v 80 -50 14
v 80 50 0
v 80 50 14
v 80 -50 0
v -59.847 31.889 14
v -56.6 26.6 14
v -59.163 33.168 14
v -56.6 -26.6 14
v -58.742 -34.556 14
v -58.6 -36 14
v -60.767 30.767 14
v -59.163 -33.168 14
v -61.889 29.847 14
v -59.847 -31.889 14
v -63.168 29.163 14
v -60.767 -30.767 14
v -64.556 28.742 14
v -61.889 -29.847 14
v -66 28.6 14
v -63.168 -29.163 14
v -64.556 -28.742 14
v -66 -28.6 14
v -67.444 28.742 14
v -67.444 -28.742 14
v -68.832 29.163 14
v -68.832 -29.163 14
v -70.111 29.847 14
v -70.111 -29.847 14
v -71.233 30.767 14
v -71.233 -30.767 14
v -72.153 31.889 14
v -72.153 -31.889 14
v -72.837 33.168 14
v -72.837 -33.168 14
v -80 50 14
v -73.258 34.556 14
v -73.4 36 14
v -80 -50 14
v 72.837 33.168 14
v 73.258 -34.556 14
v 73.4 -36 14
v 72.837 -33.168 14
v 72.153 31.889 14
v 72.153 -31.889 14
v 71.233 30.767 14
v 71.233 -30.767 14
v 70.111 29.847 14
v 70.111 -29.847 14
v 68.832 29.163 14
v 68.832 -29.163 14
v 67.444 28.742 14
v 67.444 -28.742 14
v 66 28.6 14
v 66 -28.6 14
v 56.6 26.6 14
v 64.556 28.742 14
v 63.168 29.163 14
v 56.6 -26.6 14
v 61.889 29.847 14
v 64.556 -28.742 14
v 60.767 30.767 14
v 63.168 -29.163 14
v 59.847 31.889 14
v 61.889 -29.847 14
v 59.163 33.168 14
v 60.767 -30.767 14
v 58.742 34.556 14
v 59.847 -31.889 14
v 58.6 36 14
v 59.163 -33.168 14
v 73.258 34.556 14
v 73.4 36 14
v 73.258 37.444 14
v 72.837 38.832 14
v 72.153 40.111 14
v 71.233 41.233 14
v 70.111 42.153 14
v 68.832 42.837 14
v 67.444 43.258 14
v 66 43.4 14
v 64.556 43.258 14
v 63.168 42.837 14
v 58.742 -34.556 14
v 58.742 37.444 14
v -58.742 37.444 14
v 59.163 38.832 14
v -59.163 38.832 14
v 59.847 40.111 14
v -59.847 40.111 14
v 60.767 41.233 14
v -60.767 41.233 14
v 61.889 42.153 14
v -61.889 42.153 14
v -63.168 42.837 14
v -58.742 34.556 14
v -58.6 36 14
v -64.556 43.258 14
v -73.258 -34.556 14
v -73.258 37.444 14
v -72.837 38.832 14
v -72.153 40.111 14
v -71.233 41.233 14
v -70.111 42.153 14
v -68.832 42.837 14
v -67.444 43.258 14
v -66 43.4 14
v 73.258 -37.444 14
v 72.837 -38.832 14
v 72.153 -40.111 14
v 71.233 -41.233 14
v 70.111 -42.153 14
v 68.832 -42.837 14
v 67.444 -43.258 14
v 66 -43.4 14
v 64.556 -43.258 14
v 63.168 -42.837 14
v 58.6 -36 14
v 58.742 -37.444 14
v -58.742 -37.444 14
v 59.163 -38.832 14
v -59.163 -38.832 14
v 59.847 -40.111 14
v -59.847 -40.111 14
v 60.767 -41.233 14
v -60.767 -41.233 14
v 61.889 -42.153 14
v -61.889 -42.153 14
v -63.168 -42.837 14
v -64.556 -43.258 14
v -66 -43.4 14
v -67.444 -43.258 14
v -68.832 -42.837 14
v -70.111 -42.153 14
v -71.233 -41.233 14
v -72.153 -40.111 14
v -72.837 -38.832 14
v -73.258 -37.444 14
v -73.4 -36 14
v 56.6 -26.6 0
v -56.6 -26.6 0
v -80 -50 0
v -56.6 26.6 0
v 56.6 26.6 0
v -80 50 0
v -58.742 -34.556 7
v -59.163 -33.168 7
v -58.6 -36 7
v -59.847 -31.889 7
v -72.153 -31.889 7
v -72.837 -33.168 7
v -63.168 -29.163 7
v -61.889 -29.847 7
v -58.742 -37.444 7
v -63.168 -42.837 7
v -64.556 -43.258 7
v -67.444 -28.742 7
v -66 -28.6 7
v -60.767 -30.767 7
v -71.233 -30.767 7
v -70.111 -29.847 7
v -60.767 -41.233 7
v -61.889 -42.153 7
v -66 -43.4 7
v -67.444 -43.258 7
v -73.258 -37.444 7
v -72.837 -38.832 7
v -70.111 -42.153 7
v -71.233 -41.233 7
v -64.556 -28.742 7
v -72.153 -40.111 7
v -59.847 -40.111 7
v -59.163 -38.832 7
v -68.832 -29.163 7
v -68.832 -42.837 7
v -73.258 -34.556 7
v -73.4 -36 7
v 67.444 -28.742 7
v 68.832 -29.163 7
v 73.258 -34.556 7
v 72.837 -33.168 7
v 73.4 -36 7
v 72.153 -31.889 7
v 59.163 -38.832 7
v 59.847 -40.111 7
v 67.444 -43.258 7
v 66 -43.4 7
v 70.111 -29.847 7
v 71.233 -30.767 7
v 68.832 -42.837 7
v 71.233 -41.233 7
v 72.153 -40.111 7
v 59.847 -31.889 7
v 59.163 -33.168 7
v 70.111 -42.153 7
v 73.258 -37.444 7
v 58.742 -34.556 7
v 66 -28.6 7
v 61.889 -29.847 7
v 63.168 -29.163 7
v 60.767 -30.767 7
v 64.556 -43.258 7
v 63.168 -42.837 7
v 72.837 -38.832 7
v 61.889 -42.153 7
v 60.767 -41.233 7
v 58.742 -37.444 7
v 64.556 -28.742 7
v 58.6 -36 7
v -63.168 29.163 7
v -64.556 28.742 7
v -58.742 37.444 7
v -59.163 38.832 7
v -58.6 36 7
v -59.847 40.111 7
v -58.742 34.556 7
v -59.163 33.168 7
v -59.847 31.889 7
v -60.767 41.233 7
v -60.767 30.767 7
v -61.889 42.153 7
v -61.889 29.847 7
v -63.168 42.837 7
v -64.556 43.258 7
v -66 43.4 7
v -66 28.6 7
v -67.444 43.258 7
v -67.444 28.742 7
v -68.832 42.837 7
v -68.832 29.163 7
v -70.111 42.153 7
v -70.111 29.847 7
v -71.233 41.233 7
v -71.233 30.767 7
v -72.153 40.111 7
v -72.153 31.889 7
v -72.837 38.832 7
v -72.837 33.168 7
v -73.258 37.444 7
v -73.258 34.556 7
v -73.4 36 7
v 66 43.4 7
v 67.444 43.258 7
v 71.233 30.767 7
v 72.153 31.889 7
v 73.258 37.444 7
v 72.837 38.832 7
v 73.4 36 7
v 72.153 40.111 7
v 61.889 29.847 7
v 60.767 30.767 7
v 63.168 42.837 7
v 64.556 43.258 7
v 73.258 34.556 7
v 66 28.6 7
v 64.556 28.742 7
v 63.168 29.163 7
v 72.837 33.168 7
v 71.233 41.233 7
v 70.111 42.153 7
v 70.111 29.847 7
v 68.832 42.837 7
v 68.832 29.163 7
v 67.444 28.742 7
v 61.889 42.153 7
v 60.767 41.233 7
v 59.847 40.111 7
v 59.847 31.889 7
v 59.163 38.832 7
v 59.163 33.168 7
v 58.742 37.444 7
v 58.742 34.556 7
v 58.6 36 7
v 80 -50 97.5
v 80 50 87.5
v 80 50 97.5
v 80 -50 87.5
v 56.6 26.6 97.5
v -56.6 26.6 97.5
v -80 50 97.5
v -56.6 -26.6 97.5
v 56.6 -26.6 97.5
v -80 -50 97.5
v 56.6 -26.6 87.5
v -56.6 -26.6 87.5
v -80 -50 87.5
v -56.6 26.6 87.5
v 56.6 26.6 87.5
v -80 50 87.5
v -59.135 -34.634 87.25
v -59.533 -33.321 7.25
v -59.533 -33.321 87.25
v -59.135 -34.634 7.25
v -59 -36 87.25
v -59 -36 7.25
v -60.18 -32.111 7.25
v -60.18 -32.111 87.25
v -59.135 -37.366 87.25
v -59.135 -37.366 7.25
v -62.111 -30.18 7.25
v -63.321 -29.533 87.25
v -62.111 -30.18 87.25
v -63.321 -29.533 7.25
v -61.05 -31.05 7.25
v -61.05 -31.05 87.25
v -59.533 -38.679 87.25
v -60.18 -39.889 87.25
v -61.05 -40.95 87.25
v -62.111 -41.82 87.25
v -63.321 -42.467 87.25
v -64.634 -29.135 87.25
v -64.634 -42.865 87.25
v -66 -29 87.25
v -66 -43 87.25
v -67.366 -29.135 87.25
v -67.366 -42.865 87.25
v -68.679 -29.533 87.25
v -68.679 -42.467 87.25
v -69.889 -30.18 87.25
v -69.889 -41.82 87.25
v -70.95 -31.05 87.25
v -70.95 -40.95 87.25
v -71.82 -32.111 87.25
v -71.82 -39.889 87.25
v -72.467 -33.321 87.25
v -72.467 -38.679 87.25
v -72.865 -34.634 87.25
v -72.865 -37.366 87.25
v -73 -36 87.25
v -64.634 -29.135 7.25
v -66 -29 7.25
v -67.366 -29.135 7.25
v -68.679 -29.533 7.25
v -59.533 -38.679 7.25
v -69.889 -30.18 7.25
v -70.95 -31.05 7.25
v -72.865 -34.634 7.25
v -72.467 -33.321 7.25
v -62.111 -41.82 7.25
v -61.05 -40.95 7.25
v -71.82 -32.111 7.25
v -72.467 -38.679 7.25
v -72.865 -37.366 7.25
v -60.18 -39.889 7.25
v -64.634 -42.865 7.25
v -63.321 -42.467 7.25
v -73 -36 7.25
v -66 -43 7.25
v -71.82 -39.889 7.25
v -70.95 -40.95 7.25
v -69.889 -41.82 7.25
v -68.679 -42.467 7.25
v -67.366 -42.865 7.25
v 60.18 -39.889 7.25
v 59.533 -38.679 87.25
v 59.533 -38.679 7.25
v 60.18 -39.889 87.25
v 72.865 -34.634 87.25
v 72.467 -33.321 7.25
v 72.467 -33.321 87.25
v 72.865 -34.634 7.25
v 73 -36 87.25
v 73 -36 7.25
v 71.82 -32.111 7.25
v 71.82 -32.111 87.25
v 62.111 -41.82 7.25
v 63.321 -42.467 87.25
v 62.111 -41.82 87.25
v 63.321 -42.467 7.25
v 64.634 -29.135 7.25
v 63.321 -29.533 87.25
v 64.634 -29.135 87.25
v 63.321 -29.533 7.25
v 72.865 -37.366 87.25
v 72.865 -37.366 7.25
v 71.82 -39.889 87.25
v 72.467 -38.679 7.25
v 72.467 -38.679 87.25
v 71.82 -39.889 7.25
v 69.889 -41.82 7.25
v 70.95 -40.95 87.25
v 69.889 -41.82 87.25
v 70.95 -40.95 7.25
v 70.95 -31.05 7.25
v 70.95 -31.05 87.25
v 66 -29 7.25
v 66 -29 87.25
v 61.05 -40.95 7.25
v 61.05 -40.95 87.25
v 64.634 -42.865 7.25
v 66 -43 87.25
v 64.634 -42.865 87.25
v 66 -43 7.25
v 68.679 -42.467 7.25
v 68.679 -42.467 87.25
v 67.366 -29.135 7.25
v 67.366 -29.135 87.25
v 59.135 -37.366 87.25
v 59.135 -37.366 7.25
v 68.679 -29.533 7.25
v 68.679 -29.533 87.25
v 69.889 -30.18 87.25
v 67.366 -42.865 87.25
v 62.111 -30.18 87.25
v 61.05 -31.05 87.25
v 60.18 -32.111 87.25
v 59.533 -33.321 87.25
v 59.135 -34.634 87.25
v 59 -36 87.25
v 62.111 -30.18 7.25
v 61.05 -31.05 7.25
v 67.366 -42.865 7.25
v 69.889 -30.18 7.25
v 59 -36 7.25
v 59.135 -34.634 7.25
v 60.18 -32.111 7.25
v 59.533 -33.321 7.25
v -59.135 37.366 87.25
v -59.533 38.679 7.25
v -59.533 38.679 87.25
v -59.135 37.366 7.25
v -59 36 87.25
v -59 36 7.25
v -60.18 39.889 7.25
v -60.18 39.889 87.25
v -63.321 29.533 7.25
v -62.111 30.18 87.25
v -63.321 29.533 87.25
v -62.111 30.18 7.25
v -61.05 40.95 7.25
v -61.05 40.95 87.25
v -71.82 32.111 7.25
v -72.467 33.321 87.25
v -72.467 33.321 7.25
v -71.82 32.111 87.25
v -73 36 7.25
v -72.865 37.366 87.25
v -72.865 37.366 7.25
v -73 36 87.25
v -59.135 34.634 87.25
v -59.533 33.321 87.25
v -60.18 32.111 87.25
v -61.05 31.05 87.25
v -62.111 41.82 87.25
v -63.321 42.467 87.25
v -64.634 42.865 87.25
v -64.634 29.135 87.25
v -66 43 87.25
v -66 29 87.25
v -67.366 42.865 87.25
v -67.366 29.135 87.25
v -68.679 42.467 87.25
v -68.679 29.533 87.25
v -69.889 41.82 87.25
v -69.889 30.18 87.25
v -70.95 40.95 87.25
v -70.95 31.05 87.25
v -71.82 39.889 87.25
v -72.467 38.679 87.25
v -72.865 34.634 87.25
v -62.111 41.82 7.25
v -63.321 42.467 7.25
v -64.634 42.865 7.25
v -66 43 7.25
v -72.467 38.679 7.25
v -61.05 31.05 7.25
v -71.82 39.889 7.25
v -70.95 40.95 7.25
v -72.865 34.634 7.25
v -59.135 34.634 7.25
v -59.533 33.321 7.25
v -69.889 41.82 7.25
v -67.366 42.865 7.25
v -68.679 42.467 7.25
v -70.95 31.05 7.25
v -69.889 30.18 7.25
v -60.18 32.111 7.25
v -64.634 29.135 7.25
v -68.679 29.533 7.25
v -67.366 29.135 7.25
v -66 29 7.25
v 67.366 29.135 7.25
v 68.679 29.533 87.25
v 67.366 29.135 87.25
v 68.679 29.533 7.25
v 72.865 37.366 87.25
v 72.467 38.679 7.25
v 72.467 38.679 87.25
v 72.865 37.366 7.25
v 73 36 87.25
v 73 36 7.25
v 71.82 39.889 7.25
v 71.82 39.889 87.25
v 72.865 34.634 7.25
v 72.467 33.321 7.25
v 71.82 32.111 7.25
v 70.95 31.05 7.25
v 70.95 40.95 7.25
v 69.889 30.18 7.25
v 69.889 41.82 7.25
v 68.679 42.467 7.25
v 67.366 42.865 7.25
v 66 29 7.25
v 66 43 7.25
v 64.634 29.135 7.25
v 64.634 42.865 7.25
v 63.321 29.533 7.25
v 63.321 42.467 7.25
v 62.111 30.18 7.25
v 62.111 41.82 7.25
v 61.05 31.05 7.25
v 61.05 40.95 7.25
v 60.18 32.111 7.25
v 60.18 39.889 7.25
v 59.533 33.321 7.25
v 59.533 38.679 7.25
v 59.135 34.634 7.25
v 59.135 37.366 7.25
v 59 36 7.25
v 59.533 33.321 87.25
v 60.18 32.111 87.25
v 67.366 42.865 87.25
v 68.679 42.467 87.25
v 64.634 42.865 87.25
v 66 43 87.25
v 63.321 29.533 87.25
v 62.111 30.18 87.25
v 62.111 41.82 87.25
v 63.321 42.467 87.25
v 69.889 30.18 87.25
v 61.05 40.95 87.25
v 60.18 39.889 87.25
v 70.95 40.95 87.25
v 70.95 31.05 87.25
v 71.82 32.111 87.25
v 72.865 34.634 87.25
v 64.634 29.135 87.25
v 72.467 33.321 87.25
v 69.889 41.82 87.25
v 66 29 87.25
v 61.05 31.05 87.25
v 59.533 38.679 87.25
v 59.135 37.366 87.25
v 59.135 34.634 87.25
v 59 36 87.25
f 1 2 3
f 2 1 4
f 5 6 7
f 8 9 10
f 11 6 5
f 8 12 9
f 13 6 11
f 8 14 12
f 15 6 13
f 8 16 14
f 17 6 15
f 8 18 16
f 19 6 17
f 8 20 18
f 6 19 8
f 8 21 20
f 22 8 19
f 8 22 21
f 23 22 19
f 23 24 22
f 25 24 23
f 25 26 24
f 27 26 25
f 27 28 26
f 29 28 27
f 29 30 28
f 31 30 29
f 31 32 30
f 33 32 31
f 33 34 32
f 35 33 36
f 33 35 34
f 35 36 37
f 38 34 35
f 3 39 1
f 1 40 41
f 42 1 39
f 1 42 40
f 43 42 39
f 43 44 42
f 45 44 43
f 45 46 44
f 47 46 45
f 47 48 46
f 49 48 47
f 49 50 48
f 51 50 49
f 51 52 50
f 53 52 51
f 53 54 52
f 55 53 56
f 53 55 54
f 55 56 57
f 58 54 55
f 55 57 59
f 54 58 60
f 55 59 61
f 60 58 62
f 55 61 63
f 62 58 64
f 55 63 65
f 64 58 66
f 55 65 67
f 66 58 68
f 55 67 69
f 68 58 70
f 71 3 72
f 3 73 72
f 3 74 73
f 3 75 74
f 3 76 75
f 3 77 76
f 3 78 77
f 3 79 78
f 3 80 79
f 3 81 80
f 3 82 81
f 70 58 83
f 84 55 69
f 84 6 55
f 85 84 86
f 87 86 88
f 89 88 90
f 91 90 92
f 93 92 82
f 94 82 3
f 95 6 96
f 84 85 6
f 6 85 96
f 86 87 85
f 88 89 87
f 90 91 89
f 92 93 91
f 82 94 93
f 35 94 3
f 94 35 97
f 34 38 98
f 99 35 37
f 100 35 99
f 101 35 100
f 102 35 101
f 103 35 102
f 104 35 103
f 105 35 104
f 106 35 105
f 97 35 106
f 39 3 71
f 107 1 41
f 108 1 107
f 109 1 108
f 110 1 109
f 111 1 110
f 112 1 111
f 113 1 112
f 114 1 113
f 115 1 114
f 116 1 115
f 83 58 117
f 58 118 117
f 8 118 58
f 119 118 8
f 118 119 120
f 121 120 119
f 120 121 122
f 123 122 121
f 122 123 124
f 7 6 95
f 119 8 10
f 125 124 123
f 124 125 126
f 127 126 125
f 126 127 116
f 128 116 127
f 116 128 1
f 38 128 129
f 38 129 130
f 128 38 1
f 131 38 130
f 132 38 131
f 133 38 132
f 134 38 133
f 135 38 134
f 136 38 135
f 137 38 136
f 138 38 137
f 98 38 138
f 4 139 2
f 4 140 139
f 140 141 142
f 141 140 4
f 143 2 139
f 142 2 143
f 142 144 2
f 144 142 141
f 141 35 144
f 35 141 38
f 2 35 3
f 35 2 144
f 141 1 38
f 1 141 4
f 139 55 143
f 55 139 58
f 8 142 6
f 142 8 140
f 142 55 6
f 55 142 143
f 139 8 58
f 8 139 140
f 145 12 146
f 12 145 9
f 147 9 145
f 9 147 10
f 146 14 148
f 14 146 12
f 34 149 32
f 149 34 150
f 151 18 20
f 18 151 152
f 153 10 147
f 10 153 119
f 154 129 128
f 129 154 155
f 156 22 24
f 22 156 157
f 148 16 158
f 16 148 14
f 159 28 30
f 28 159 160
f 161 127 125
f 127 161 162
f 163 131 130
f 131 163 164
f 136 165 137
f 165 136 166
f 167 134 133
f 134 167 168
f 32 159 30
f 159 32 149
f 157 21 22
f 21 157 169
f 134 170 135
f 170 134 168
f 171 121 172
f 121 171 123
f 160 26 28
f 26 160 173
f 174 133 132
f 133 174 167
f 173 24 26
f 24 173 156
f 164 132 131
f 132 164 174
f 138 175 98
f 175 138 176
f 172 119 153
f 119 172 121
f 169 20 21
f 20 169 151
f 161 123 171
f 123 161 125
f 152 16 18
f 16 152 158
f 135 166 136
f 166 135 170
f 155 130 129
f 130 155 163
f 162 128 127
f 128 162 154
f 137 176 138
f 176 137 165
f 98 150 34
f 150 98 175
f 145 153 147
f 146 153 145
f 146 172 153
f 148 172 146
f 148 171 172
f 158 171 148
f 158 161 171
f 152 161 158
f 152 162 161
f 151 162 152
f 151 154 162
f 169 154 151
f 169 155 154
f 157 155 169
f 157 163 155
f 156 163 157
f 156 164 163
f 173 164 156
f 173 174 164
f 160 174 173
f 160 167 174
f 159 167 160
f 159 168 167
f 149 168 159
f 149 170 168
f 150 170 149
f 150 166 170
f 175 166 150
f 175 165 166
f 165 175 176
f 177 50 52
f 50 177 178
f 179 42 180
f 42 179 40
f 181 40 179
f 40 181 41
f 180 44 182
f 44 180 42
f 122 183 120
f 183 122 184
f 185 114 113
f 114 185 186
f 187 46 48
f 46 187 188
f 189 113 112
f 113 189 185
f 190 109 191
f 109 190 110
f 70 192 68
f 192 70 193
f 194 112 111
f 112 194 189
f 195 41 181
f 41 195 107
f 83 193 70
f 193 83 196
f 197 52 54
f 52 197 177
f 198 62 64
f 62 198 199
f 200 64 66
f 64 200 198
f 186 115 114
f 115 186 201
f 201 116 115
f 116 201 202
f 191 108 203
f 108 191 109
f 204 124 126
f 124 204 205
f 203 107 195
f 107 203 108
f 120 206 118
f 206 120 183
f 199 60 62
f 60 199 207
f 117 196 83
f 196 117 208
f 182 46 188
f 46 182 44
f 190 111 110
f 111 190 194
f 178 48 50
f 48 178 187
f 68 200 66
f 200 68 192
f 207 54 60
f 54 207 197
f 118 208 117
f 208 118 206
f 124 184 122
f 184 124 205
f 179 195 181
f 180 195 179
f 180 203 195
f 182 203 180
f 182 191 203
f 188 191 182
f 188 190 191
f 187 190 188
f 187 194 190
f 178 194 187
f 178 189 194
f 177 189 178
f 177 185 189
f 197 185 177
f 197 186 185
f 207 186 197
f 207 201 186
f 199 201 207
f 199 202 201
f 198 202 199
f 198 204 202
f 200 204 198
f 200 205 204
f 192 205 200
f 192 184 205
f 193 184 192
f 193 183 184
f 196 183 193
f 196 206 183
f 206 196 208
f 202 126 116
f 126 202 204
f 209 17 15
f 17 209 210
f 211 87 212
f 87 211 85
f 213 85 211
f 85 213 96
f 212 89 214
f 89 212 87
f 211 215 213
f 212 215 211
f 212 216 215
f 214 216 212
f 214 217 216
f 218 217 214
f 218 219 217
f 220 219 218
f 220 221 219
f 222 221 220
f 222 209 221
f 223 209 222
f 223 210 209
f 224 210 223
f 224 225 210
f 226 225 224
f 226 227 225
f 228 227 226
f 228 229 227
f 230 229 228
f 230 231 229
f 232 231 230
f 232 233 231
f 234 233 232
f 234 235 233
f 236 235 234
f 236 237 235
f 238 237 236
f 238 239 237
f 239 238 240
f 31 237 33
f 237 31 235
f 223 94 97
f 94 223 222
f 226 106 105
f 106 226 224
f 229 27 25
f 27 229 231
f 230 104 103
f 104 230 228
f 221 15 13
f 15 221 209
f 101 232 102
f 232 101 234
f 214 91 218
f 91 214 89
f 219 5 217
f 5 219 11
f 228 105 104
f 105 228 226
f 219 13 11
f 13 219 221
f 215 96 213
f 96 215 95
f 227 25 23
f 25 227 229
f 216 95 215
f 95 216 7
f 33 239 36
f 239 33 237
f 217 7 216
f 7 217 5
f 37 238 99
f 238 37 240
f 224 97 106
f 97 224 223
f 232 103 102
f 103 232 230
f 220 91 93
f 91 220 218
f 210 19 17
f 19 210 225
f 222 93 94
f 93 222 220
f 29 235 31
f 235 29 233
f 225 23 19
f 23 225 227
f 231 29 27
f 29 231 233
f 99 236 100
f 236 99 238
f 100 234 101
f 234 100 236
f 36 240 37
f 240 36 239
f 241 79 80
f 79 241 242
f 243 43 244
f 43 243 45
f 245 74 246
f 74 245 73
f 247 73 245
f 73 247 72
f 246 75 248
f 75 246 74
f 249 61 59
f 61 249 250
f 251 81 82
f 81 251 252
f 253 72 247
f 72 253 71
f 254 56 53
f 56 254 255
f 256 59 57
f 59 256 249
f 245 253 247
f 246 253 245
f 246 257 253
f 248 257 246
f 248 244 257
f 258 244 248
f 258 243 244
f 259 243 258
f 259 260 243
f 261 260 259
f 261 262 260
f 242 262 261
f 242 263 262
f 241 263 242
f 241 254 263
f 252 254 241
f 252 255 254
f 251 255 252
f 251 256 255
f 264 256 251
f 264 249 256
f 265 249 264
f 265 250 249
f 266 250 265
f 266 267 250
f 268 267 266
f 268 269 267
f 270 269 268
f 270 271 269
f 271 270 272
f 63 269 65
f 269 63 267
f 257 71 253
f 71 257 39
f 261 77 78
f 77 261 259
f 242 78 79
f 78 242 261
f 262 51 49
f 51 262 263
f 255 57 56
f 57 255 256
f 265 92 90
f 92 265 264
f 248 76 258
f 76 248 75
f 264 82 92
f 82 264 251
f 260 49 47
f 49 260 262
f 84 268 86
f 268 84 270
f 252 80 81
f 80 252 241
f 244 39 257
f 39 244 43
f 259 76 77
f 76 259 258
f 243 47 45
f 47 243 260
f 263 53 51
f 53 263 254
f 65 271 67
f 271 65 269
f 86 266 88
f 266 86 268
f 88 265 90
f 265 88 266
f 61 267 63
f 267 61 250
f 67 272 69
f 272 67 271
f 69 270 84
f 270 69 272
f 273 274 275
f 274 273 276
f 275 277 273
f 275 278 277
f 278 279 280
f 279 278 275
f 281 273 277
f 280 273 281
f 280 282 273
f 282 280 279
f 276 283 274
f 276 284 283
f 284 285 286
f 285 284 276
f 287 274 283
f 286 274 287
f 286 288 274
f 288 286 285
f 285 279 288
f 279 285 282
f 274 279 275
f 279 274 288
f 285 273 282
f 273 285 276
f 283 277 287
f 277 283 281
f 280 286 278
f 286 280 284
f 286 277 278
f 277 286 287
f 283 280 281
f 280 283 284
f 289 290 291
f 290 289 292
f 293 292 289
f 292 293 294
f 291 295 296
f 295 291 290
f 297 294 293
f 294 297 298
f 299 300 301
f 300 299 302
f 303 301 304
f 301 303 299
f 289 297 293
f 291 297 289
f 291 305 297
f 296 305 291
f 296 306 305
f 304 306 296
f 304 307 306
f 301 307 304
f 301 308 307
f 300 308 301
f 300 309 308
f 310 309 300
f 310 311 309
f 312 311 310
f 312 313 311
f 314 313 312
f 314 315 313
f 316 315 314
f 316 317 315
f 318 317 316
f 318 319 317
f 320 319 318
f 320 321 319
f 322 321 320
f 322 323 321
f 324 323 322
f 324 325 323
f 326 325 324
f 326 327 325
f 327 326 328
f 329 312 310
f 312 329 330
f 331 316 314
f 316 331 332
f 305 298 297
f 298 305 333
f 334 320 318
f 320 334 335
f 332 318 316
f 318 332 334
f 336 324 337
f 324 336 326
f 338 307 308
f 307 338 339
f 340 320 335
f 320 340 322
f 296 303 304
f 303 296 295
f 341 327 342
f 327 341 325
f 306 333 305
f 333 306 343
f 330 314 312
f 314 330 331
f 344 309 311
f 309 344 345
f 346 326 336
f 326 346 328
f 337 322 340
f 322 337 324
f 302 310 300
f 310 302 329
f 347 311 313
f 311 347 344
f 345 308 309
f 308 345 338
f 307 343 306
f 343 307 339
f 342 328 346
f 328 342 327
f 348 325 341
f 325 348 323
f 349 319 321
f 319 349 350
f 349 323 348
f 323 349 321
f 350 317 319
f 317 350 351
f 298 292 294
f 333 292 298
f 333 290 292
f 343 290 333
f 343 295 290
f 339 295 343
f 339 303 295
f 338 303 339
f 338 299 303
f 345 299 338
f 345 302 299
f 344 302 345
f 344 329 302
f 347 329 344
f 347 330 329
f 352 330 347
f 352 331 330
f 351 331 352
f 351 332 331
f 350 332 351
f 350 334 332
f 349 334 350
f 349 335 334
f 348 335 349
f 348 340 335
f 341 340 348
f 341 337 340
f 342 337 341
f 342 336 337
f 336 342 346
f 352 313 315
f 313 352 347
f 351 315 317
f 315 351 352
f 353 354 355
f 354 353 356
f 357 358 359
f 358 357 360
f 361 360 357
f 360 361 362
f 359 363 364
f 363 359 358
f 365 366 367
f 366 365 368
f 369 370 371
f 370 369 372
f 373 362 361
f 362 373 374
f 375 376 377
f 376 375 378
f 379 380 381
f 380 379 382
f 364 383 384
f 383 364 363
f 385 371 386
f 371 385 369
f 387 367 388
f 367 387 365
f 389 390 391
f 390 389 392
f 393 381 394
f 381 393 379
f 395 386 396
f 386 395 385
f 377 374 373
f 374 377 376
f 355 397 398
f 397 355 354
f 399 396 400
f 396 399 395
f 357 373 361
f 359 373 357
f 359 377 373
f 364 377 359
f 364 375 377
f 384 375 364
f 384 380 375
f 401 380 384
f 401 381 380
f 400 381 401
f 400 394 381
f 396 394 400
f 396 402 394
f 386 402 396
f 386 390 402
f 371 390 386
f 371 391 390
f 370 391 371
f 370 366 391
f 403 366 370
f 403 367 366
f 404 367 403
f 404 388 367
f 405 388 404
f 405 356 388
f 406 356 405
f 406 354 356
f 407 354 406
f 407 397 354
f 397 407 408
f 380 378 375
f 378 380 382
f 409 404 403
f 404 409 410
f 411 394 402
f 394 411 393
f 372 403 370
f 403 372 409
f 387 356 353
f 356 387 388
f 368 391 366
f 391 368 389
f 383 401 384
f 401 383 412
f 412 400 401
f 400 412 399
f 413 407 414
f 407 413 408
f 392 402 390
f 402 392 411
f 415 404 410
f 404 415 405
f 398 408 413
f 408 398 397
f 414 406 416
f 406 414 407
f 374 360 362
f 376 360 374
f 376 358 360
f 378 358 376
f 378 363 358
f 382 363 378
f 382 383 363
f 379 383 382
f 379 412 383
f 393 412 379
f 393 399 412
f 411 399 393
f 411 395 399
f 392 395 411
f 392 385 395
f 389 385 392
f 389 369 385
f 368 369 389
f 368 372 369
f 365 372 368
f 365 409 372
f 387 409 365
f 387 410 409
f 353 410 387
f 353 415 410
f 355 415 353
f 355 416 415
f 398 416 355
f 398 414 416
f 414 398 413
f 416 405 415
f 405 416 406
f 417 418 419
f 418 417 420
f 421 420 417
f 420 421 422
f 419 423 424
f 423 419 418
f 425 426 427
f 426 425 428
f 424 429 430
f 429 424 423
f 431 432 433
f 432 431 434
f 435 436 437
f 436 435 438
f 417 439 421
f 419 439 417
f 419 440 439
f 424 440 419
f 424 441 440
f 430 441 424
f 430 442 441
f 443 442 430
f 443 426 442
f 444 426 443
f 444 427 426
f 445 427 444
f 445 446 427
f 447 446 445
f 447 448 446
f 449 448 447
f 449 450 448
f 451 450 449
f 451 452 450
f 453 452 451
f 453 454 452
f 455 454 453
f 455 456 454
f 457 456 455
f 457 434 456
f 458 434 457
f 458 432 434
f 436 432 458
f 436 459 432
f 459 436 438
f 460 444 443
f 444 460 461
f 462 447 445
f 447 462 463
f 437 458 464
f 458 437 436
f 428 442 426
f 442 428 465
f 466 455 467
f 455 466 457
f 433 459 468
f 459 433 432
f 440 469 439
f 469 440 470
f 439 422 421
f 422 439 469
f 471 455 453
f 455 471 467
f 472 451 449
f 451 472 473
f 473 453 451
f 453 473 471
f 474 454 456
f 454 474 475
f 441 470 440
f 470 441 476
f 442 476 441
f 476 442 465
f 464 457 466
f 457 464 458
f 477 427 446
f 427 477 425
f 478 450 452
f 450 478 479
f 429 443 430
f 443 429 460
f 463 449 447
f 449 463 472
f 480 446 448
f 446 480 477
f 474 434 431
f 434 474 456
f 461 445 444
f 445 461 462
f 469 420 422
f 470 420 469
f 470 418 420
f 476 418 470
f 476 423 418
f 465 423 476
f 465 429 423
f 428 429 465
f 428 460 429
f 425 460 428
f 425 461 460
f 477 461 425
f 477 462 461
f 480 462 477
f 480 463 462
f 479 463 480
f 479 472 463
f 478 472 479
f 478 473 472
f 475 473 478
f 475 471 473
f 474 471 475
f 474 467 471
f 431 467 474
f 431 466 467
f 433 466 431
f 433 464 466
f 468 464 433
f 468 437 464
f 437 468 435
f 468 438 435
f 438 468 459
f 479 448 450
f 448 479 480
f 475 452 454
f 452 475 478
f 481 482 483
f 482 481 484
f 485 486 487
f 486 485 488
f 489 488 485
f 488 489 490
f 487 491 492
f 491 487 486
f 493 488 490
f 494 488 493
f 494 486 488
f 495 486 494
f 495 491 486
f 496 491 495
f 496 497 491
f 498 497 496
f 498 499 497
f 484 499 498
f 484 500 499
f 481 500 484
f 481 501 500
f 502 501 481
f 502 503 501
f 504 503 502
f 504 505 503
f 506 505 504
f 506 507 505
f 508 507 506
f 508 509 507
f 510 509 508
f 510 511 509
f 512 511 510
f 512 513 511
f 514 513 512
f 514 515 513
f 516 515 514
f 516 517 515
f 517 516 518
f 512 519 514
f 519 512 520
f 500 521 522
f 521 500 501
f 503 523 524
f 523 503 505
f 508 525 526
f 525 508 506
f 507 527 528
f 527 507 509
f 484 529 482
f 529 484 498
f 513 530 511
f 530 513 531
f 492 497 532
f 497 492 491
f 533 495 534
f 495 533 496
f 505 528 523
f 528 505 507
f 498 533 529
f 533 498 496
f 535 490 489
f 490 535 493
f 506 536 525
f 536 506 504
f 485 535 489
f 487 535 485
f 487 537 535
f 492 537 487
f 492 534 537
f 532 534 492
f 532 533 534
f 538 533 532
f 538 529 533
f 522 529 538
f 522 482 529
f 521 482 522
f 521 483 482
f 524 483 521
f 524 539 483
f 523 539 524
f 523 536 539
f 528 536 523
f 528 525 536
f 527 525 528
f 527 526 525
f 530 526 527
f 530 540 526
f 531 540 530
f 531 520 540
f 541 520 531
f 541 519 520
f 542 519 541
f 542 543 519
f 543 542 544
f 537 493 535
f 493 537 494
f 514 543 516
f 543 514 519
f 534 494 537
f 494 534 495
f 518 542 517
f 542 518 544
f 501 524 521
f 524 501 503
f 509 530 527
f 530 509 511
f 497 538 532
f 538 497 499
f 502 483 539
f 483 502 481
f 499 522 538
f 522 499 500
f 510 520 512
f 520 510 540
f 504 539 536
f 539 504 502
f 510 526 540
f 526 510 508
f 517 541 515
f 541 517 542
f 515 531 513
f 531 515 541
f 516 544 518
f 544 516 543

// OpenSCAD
$fn = 32;

// ------------------------------------------------------------------------
// Frame cube: base 160 x 100 mm, posts 80 mm tall
// Every part is its own module, assembly() places every instance.
// ------------------------------------------------------------------------

// --- part 1 ---
module base_frame() {
  difference() {
    translate([-80, -50, 0]) cube([160, 100, 14]);
    translate([-56.6, -26.6, -1]) cube([113.2, 53.2, 16]);
    translate([-66, -36, 7]) cylinder(h = 8, d = 14.8);
    translate([66, -36, 7]) cylinder(h = 8, d = 14.8);
    translate([-66, 36, 7]) cylinder(h = 8, d = 14.8);
    translate([66, 36, 7]) cylinder(h = 8, d = 14.8);
  }
}

// --- part 2 ---
module corner_post() {
  cylinder(h = 80, d = 14);
}

// --- part 3 ---
module top_frame() {
  difference() {
    translate([-80, -50, 0]) cube([160, 100, 10]);
    translate([-56.6, -26.6, -1]) cube([113.2, 53.2, 12]);
  }
}

// --- assembly ---
module assembly() {
  color([0.80, 0.24, 0.20]) translate([0, 0, 0]) rotate([0, 0, 0]) base_frame();
  color([0.20, 0.45, 0.75]) translate([-66, -36, 7.25]) rotate([0, 0, 0]) corner_post();
  color([0.25, 0.62, 0.32]) translate([66, -36, 7.25]) rotate([0, 0, 0]) corner_post();
  color([0.92, 0.70, 0.18]) translate([-66, 36, 7.25]) rotate([0, 0, 0]) corner_post();
  color([0.58, 0.35, 0.70]) translate([66, 36, 7.25]) rotate([0, 0, 0]) corner_post();
  color([0.16, 0.66, 0.66]) translate([0, 0, 87.5]) rotate([0, 0, 0]) top_frame();
}

assembly();
